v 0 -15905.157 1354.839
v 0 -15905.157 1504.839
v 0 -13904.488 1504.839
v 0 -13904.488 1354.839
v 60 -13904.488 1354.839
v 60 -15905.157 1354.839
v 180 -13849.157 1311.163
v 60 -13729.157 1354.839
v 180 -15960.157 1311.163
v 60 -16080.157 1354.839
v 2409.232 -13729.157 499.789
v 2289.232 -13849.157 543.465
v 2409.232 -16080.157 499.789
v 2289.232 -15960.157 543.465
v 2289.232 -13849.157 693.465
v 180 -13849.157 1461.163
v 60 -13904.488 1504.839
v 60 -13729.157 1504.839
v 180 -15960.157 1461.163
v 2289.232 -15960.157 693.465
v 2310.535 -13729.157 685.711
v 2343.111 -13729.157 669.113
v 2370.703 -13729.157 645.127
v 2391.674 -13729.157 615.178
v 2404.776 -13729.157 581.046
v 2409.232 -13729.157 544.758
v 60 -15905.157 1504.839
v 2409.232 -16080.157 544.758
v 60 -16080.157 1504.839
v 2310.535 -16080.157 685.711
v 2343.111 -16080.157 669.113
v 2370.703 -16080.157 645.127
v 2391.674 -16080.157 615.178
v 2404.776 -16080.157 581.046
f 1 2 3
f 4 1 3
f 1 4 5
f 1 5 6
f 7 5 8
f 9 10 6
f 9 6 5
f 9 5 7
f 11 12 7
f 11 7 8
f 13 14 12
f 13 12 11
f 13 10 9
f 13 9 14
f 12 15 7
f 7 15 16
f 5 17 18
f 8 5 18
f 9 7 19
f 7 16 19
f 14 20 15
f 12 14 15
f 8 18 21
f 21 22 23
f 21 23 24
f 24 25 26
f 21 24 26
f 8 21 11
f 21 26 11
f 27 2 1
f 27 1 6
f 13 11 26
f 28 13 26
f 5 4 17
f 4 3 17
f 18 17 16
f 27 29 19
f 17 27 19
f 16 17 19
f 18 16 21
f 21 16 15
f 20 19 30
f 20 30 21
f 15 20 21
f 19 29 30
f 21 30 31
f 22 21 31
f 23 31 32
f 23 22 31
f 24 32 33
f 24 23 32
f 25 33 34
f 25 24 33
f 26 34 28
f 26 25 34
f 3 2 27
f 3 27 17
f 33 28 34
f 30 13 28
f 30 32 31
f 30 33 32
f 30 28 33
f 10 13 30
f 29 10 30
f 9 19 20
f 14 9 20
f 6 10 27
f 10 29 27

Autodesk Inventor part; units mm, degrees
ref_plane "YZ Plane" through (0, 0, 0) normal (1, 0, 0) x (0, 1, 0)
ref_plane "XZ Plane" through (0, 0, 0) normal (0, 1, 0) x (-1, 0, 0)
sketch "Sketch1" plane through (0, 0, 0) normal (1, 0, 0) x (0, 1, 0)
  line L0 (-16080.1567, 1504.8391) -> (-13729.4879, 1504.8391)
  line L1 (-13729.4879, 1504.8391) -> (-13729.4879, 1354.8391)
  line L2 (-13729.4879, 1354.8391) -> (-16080.1567, 1354.8391)
  line L3 (-16080.1567, 1354.8391) -> (-16080.1567, 1504.8391)
  point P0 (0, 0)
  point P1 (-16255.1567, 1504.8391)
  point P2 (-15905.1567, 1504.8391)
  point P3 (-13904.4879, 1504.8391)
  point P4 (-13554.4879, 1504.8391)
  point P5 (-13729.4879, 1504.8391)
  dimension "d3" = 150
extrude "Extrusion1" add sketch "Sketch1" along normal blind 60
sketch "Sketch2" plane through (60, 0, 0) normal (1, 0, 0) x (0, 0, -1)
  line L0 (-1354.8391, -16080.1567) -> (-1354.8391, -13729.4879) projected
  line L1 (-1354.8391, -13729.4879) -> (-1504.8391, -13729.4879) projected
  line L2 (-1504.8391, -13729.4879) -> (-1504.8391, -16080.1567) projected
  line L3 (-1504.8391, -16080.1567) -> (-1354.8391, -16080.1567) projected
  point P0 (0, 0)
ref_plane "Work Plane1" through (0, -16080.1567, 1504.8391) normal (0, -1, 0) x (0, 0, -1)
sketch "Sketch3" plane through (0, -16080.1567, 1504.8391) normal (0, -1, 0) x (0, 0, -1)
  line L0 (0, 60) -> (150, 60) projected
  line L1 (0, 60) -> (150, 60)
  line L2 (0, 60) -> (855.0504, 2409.2316)
  line L3 (0, 60) -> (2500, 60) construction
  line L4 (150, 60) -> (1005.0504, 2409.2316)
  line L5 (150, 60) -> (2650, 60) construction
  line L6 (1005.0504, 2409.2316) -> (855.0504, 2409.2316)
  point P0 (1504.8391, 0)
  dimension "d6" = 2500
  dimension "d7" = 70
  dimension "d8" = 70
extrude "Extrusion2" add sketch "Sketch3" against normal blind 2351
sketch "Sketch4" plane through (0, -16080.1567, 1504.8391) normal (0, 0, 1) x (1, 0, 0)
  line L0 (2409.2316, 0) -> (60, 0) projected
  line L1 (2409.2316, 0) -> (2409.2316, 2351) projected
  line L2 (60, 2351) -> (2409.2316, 2351) projected
  line L3 (60, 2350.6688) -> (60, 2351) projected
  line L4 (60, 2350.6688) -> (60, 0) projected
  line L5 (60, 2350.6688) -> (60, 0) projected
  line L6 (60, 0) -> (180, 0)
  line L7 (180, 0) -> (180, 120)
  line L8 (180, 120) -> (60, 120)
  line L9 (60, 120) -> (60, 0)
  line L10 (2409.2316, 2351) -> (2289.2316, 2351)
  line L11 (2289.2316, 2351) -> (2289.2316, 2231)
  line L12 (2289.2316, 2231) -> (2409.2316, 2231)
  line L13 (2409.2316, 2231) -> (2409.2316, 2351)
  line L14 (2289.2316, 2231) -> (180, 2231)
  line L15 (180, 2231) -> (180, 120)
  line L16 (180, 120) -> (2289.2316, 120)
  line L17 (2289.2316, 120) -> (2289.2316, 2231)
  point P0 (0, 16080.1567)
  dimension "d11" = 120
  dimension "d12" = 120
  dimension "d13" = 120
  dimension "d14" = 120
extrude "Extrusion3" cut sketch "Sketch4" against normal through all contours L15 L14 L17 L16
fillet "Fillet1" radius 150 1 edges at (2409.2316, -14904.6567, 649.7888)
sketch "Sketch5" plane through (0, -16080.1567, 1504.8391) normal (0, 0, 1) x (1, 0, 0)
  line L0 (60, 0) -> (60, 2350.6688) projected
  line L1 (0, 175) -> (60, 175)
  line L2 (60, 175) -> (60, 0)
  line L3 (60, 0) -> (0, 0)
  line L4 (0, 0) -> (0, 175)
  line L5 (60, 2351) -> (2310.5346, 2351) projected
  line L6 (0, 2175.6688) -> (60, 2175.6688)
  line L7 (60, 2175.6688) -> (60, 2351)
  line L8 (60, 2351) -> (0, 2351)
  line L9 (0, 2351) -> (0, 2175.6688)
  point P0 (0, 16080.1567)
extrude "Extrusion4" cut sketch "Sketch5" against normal through all
properties part number "side_curve_frame_01" material "Wood (Maple)"
